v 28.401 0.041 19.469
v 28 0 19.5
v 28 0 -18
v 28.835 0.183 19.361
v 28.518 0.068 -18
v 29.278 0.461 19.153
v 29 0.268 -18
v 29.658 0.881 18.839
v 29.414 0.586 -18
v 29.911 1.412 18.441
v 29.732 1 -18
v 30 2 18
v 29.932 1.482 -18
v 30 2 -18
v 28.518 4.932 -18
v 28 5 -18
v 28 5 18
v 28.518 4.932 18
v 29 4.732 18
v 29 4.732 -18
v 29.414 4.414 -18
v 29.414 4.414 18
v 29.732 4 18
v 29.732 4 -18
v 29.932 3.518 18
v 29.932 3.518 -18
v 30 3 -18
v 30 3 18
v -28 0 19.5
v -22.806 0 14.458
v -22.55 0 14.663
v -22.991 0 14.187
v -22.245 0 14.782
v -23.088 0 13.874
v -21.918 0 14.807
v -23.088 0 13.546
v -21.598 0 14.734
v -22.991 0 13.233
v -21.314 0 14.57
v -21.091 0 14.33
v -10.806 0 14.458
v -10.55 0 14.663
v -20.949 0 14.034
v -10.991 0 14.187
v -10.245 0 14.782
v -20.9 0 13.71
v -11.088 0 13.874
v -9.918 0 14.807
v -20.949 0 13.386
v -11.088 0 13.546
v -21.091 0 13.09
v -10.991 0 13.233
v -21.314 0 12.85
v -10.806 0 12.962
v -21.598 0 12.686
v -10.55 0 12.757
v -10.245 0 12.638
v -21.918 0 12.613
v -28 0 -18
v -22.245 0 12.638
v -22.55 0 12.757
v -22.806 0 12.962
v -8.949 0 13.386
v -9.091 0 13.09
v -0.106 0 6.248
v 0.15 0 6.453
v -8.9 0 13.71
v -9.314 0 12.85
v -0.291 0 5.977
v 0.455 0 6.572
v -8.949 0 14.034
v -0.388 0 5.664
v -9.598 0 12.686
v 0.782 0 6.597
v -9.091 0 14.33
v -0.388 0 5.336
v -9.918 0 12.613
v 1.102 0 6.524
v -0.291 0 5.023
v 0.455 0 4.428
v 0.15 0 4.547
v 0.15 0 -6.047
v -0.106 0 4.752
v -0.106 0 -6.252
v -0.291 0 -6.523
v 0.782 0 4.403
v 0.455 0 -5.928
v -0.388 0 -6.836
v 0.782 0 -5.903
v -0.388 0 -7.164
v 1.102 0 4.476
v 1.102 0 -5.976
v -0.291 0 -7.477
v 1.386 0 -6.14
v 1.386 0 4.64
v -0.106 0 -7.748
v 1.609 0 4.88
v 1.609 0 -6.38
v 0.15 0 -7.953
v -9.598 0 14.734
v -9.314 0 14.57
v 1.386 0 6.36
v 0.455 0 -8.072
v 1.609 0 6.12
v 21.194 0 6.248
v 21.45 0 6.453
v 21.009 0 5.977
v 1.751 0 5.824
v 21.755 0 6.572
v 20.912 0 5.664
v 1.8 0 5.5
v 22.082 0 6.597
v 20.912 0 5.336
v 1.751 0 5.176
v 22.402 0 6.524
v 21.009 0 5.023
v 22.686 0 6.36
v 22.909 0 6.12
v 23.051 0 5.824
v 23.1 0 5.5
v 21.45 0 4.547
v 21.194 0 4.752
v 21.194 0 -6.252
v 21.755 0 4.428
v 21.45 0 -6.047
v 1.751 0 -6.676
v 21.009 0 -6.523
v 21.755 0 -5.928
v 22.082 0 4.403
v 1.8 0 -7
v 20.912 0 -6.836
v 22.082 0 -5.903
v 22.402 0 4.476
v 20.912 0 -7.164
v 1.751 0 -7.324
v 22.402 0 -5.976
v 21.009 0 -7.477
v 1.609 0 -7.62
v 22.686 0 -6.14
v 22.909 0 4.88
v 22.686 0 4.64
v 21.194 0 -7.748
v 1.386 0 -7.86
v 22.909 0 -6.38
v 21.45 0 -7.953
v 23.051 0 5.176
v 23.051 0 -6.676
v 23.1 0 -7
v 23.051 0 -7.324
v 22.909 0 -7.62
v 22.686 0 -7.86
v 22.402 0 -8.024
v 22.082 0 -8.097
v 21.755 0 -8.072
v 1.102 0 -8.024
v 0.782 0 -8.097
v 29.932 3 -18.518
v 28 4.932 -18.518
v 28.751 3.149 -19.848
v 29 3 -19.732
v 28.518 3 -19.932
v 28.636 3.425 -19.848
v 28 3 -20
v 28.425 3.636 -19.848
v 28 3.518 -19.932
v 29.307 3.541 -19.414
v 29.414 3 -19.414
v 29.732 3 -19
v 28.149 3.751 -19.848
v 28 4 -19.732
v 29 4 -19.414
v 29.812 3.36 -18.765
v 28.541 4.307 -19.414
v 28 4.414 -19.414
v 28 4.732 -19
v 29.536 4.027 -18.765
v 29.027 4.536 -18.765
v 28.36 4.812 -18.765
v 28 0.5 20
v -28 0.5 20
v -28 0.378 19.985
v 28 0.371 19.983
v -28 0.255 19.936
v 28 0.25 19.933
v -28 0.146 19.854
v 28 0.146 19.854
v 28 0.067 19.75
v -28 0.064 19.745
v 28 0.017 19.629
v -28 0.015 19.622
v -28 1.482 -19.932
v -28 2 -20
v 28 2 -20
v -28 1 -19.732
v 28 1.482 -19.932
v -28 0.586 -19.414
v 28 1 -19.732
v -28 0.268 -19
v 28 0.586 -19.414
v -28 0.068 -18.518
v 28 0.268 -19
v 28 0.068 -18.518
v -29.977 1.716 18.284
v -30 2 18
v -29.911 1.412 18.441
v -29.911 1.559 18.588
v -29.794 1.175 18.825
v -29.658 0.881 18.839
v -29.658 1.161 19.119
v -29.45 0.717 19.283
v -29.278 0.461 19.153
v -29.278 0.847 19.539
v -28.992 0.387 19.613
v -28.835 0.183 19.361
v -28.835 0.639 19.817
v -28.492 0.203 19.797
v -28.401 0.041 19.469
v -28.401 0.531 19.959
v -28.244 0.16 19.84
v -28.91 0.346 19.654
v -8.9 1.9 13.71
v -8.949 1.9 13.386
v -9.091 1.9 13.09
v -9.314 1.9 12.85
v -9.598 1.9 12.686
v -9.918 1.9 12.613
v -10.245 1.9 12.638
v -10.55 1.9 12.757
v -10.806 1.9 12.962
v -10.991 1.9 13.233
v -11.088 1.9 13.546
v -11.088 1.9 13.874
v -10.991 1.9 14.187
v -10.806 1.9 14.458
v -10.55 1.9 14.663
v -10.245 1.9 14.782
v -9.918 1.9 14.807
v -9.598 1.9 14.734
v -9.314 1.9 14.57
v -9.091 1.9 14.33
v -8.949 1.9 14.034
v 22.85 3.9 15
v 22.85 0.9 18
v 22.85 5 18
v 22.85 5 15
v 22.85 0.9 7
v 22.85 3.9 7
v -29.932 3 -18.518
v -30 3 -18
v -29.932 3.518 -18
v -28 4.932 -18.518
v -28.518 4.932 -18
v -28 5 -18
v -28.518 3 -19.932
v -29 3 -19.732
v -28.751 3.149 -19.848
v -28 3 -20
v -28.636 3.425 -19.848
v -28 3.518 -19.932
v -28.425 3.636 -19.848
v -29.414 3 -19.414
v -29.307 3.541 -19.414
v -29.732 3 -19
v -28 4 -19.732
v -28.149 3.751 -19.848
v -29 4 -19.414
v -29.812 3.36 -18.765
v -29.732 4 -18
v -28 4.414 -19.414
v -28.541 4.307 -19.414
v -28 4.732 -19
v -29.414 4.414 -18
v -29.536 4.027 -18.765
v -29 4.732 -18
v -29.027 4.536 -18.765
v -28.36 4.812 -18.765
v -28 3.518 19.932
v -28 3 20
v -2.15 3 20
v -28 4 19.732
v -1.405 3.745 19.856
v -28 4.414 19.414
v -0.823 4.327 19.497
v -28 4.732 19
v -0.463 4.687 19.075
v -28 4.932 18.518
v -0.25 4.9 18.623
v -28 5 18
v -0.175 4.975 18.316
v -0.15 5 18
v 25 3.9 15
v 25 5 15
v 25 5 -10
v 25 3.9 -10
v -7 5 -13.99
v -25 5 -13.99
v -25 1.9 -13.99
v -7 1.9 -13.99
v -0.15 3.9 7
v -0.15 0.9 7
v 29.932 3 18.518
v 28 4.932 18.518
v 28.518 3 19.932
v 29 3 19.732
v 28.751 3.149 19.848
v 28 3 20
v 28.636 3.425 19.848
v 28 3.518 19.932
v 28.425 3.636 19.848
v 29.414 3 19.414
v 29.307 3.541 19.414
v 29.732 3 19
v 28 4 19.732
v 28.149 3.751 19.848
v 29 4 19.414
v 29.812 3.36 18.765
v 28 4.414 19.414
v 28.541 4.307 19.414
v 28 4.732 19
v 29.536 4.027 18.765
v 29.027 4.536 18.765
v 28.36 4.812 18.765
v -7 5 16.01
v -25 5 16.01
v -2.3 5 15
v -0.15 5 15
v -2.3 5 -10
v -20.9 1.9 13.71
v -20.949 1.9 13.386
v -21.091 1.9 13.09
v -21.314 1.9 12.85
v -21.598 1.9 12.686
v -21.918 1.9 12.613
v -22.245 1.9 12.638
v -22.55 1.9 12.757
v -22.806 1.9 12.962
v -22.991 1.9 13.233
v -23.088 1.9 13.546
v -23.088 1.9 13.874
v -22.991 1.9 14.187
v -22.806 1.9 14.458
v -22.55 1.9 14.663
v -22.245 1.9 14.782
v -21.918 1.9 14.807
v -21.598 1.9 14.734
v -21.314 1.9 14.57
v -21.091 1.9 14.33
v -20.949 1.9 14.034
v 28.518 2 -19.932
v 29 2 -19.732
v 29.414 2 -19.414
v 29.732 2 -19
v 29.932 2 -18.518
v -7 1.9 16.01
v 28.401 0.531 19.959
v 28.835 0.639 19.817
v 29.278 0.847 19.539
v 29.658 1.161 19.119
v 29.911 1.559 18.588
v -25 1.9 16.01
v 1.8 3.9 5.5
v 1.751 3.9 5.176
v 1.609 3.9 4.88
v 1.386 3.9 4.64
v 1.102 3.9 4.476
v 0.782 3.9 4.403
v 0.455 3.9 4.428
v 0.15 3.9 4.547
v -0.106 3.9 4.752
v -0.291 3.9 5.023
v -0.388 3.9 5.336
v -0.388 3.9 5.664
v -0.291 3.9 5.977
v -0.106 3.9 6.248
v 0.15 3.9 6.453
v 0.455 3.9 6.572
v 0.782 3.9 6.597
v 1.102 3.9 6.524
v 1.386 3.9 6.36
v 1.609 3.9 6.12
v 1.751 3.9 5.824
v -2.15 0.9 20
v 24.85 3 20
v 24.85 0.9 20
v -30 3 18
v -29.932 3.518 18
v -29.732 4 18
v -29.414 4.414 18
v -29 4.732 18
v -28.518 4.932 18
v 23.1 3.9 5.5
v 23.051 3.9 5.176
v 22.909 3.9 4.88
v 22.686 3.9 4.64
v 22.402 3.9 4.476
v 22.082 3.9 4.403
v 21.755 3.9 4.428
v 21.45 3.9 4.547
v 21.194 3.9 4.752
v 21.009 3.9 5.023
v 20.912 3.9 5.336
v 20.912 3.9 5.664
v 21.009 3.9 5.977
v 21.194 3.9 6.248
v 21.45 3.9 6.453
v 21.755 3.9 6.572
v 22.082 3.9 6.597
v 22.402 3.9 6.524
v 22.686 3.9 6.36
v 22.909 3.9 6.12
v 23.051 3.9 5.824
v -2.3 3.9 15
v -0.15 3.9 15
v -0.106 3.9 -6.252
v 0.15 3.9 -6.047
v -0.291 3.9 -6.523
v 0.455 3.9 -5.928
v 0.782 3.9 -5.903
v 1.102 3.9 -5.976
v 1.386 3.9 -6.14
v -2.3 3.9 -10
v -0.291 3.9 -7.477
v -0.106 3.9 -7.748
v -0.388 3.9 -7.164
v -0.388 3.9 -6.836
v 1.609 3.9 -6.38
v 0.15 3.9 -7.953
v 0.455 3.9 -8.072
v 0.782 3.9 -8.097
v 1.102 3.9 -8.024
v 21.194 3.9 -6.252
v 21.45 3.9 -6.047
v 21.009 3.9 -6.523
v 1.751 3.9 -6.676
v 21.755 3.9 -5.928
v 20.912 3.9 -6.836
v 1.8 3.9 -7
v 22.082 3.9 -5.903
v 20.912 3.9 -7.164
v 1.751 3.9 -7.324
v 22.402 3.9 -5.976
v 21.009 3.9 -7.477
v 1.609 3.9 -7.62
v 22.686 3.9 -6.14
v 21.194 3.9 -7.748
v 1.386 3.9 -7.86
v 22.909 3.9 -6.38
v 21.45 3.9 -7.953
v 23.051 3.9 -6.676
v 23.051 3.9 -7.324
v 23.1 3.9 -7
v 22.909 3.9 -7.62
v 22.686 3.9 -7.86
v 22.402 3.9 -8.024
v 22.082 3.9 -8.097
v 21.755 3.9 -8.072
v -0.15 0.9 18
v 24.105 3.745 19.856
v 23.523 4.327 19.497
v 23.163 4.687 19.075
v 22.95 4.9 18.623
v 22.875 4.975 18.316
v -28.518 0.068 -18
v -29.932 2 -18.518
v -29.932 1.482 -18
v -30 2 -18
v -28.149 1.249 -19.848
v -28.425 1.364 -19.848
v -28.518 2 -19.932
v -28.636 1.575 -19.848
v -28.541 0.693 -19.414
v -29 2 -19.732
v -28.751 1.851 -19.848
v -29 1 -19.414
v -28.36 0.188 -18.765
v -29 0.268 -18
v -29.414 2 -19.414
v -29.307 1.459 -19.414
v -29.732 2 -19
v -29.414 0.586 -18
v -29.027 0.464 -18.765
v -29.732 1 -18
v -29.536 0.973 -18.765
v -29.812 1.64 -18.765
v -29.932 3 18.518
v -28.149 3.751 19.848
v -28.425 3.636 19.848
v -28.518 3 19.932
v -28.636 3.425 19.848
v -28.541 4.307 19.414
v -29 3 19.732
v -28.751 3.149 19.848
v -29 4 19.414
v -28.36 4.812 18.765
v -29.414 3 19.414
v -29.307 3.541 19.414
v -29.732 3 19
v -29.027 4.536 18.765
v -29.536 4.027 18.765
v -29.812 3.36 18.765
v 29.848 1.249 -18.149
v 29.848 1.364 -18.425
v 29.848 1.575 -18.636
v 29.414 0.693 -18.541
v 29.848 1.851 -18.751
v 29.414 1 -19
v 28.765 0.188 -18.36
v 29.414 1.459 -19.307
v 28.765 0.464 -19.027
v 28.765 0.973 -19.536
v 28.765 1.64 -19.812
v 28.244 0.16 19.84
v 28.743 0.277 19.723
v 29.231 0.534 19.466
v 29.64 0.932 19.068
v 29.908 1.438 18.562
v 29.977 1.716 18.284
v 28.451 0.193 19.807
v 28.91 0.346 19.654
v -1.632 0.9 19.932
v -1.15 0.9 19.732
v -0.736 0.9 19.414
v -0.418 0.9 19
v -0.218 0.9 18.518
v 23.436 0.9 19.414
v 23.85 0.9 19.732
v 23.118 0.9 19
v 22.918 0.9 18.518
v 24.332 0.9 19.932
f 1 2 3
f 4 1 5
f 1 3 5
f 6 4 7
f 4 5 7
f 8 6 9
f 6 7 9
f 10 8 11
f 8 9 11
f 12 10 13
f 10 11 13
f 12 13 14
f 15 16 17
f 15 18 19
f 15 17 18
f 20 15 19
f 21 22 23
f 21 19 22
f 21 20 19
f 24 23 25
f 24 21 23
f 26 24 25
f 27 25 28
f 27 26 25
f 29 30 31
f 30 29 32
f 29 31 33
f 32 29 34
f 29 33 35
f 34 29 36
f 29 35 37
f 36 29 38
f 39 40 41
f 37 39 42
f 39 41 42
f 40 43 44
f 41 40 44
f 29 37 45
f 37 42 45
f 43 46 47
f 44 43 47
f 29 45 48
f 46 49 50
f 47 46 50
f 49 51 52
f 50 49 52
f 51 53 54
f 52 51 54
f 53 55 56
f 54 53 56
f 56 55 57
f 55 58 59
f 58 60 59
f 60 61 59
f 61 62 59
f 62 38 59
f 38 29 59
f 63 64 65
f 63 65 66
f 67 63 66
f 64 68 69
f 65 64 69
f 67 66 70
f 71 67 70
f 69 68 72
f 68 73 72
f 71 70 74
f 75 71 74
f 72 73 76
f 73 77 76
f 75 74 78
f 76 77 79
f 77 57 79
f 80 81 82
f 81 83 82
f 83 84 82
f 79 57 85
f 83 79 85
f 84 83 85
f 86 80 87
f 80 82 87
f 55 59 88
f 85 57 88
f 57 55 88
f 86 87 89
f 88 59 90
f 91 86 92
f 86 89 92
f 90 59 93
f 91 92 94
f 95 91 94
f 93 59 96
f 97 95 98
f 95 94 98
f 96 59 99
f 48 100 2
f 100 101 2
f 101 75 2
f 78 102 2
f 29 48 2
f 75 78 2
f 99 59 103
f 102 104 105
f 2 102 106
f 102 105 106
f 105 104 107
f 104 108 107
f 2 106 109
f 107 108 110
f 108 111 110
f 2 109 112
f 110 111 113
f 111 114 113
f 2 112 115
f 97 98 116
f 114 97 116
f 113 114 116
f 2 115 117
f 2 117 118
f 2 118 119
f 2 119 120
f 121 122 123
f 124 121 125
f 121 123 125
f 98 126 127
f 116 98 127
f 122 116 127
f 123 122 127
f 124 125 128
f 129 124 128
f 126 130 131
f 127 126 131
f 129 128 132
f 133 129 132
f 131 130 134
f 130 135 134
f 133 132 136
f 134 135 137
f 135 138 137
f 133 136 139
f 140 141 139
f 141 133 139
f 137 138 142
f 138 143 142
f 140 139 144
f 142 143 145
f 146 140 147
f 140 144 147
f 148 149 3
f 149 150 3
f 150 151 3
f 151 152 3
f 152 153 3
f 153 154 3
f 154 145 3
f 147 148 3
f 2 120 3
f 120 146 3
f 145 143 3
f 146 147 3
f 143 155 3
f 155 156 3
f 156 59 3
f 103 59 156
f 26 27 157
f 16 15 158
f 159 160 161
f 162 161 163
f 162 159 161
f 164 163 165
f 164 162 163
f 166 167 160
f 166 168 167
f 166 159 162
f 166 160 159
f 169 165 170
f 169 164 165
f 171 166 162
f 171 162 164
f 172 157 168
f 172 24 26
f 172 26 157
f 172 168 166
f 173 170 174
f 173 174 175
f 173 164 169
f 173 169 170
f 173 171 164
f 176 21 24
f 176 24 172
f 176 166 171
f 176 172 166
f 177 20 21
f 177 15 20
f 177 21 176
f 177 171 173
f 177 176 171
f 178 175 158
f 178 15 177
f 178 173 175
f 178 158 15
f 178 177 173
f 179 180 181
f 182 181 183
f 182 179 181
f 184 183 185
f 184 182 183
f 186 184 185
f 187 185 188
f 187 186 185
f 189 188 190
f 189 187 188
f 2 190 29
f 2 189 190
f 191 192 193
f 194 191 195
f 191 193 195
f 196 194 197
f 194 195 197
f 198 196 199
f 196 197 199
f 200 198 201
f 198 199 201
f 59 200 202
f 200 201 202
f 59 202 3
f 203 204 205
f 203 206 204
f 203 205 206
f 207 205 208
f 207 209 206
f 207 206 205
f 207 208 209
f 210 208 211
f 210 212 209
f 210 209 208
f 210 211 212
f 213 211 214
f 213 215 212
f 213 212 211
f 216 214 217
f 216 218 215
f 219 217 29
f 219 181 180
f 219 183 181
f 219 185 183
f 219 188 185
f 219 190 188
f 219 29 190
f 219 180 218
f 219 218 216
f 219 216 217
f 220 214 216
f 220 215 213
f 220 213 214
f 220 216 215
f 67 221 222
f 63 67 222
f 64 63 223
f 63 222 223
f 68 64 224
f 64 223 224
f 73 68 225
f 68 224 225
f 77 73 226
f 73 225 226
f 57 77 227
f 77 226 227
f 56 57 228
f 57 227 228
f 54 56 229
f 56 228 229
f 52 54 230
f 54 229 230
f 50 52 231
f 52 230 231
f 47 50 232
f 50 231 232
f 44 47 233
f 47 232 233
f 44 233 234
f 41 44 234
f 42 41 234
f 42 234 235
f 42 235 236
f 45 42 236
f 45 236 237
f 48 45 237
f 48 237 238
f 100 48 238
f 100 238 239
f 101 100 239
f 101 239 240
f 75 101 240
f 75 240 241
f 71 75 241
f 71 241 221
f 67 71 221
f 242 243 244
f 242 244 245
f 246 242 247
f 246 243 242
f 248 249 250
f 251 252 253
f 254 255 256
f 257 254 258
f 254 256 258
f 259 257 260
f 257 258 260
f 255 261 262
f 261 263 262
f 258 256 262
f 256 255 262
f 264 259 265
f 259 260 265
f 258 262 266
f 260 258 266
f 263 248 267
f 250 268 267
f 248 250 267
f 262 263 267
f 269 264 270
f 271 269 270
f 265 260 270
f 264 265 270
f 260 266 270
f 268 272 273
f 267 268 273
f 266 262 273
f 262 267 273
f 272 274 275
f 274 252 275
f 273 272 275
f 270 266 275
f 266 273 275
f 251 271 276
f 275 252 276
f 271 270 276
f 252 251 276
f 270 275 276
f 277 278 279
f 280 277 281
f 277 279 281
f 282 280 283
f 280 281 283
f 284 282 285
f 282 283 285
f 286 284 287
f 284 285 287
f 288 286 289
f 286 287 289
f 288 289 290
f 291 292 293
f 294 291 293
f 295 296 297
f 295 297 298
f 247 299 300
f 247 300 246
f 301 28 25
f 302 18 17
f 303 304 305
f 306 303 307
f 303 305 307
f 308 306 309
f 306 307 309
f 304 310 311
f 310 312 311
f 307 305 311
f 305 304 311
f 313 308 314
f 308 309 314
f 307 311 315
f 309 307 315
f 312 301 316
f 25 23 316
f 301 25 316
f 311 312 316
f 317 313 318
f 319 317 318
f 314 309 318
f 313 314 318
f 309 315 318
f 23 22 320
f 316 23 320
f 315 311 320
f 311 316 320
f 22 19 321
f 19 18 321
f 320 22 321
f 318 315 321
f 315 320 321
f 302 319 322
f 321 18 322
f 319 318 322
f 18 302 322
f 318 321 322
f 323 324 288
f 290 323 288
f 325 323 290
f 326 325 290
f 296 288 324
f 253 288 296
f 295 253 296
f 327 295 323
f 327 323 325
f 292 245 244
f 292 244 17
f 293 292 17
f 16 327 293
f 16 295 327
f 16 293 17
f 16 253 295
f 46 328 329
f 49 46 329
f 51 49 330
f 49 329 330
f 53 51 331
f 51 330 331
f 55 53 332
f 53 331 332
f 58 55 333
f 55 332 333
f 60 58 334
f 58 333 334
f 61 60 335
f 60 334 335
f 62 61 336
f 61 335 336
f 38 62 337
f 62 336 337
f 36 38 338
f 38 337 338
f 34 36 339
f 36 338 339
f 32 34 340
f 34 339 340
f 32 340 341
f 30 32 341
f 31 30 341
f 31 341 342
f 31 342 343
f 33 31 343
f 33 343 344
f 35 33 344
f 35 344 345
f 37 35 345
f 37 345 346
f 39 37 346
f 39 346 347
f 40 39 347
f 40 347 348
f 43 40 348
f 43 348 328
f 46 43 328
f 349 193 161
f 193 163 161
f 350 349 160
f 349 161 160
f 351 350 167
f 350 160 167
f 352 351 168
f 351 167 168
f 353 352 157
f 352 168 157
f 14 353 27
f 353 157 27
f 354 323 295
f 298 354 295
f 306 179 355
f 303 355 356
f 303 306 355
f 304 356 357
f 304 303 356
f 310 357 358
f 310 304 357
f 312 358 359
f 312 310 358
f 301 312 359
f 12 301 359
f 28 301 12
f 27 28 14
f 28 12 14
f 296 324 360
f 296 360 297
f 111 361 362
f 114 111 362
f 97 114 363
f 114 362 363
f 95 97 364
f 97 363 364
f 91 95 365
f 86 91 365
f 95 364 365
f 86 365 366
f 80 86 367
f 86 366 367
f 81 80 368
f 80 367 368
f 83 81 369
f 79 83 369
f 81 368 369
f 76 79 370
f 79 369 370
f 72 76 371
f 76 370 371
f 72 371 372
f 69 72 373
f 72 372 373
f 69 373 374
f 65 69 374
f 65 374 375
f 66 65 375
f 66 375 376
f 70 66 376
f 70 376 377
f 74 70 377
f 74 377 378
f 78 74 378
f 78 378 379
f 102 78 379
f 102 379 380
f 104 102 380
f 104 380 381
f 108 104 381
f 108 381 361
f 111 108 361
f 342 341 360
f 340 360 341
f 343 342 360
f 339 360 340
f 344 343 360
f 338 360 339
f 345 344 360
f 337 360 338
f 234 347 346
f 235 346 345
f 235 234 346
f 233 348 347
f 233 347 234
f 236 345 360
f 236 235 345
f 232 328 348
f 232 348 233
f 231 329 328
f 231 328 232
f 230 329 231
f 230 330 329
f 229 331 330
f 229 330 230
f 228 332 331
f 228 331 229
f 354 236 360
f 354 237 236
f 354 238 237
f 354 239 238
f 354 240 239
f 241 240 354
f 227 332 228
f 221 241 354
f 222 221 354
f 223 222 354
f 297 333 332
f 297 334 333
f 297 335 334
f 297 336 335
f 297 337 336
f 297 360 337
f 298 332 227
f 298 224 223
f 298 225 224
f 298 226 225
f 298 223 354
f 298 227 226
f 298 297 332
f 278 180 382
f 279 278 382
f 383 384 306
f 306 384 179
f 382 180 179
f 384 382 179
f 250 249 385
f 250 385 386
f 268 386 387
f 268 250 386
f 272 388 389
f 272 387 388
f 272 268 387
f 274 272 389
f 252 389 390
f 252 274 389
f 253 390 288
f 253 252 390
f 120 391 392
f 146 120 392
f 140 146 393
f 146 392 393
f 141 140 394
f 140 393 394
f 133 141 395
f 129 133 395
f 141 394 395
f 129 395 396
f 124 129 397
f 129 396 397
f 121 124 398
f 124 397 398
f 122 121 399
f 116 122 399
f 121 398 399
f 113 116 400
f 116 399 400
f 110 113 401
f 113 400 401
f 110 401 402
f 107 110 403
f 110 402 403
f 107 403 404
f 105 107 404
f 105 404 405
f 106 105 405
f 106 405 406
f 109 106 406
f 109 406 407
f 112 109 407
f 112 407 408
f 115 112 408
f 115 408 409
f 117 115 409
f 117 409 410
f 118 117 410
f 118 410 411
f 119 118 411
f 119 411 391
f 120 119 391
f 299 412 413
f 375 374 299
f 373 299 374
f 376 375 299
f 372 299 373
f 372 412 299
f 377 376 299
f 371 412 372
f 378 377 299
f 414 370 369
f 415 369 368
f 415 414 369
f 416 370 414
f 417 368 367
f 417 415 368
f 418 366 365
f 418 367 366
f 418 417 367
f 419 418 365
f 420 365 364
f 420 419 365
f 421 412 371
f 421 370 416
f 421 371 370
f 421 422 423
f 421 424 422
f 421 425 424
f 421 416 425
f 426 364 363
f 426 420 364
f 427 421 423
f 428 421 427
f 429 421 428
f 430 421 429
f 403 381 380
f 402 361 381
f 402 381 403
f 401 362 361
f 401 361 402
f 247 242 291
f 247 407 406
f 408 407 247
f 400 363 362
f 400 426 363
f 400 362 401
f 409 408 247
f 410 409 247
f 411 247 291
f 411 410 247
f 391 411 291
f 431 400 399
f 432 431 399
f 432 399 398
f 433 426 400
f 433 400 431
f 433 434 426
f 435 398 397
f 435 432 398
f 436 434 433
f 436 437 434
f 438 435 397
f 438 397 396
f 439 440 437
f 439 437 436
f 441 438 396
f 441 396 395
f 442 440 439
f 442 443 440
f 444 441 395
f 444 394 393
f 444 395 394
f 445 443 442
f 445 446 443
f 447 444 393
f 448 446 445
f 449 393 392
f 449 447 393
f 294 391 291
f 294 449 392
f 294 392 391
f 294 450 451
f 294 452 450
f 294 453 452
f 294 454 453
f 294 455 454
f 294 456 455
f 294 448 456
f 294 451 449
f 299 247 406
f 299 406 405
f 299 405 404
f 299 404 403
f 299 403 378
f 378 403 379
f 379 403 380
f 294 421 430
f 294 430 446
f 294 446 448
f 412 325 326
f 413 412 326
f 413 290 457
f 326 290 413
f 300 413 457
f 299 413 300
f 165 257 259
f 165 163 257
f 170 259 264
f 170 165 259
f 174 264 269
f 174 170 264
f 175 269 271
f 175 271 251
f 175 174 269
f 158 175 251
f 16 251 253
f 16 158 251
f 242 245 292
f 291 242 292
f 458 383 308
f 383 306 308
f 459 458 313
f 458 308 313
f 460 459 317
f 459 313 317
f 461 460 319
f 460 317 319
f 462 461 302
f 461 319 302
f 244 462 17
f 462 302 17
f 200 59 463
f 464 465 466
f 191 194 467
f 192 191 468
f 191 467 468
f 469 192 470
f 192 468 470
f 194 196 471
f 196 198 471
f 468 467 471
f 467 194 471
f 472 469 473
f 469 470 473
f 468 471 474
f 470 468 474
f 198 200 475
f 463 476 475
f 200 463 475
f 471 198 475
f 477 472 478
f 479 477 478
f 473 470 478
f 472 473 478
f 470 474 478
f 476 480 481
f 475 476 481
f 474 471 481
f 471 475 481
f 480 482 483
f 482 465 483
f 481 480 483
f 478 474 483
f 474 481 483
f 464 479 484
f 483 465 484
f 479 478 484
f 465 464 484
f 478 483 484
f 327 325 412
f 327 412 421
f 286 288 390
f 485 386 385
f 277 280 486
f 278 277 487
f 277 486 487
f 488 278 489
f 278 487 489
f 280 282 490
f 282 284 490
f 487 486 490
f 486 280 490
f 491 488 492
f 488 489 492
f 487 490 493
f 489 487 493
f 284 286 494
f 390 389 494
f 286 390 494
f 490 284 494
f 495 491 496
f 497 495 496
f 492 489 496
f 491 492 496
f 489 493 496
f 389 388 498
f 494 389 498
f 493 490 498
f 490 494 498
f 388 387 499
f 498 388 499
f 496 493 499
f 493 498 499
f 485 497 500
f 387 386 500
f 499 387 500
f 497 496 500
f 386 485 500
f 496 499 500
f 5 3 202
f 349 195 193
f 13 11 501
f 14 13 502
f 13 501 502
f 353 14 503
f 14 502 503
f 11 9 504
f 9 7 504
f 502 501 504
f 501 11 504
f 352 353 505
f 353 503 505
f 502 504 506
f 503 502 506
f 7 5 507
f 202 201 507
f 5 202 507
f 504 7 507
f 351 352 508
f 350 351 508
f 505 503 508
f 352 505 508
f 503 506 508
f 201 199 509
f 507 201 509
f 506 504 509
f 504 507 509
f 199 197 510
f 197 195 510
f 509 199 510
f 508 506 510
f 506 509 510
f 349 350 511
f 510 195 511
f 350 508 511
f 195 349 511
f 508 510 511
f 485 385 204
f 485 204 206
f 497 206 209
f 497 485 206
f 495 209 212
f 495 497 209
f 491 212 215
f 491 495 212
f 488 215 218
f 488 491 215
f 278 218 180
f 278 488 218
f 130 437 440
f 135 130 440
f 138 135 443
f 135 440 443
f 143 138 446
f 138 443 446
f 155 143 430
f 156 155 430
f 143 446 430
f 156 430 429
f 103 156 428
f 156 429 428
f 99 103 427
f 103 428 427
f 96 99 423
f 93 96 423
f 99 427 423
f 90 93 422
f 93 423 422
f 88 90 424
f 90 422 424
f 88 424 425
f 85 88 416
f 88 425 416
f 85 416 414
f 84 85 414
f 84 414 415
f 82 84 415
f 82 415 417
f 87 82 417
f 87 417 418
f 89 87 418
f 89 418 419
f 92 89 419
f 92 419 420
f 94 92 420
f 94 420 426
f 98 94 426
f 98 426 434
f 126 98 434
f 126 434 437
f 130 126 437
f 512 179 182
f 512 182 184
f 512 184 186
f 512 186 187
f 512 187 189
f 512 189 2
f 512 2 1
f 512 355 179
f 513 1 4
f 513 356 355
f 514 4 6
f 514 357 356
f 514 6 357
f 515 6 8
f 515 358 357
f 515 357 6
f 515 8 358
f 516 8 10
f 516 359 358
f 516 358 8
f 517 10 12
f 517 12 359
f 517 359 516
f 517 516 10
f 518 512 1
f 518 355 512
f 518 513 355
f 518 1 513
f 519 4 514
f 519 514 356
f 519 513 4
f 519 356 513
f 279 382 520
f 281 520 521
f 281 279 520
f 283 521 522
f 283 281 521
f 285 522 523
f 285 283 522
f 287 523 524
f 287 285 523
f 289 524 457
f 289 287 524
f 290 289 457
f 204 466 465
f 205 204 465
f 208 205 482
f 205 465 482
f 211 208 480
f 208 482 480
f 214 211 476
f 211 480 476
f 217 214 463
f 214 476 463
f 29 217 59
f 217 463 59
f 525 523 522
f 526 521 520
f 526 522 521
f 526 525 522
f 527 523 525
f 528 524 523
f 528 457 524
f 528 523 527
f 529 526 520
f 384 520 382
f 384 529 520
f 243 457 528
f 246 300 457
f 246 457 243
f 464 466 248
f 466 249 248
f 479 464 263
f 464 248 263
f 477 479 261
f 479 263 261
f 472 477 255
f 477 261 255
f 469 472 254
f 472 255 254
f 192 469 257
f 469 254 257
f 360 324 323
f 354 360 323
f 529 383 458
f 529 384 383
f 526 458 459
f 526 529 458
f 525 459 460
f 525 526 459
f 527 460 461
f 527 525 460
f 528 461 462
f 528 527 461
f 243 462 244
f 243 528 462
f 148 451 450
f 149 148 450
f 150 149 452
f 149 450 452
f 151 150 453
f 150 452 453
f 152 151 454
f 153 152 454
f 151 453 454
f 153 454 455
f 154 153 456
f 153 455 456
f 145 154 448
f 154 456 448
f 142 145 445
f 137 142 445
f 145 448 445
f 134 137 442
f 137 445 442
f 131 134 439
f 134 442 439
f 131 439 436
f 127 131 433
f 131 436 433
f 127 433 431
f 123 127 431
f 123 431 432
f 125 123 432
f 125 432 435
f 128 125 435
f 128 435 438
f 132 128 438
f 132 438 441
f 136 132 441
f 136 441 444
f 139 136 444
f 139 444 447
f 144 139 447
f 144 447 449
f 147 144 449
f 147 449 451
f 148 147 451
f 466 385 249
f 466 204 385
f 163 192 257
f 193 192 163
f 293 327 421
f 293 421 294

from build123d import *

# Parameters (mm, degrees)
SKETCH1_W               = 60
SKETCH1_H               = 40
BOSS_EXTRUDE1_DEPTH     = 5
SKETCH2_W               = 18
SKETCH2_H               = 30
SKETCH2_R               = 1.1
SKETCH2_W_2             = 27.3
SKETCH2_H_2             = 25
CUT_EXTRUDE1_DEPTH      = 1.1
SKETCH3_W               = 18
SKETCH3_H               = 30
SKETCH3_R               = 1.1
CUT_EXTRUDE2_DEPTH      = 2
SKETCH4_W               = 23
SKETCH4_H               = 13
CUT_EXTRUDE3_DEPTH      = 4
CUT_EXTRUDE3_DEPTH_BACK = 3
SKETCH5_R               = 1.1
CUT_EXTRUDE4_DEPTH      = 6
FILLET1_R               = 2
FILLET2_R               = 0.5


with BuildPart() as part:
    # Sketch1 → Boss-Extrude1 (new body)
    with BuildSketch(Plane(origin=(0, 0, 0), x_dir=(1, 0, 0), z_dir=(0, 1, 0))):
        Rectangle(SKETCH1_W, SKETCH1_H)
    extrude(amount=BOSS_EXTRUDE1_DEPTH)

    # Sketch2 → Cut-Extrude1 (cut)
    with BuildSketch(Plane(origin=(0, 5, 0), x_dir=(1, 0, 0), z_dir=(0, 1, 0))):
        with Locations((-16, -1.01)):
            Rectangle(SKETCH2_W, SKETCH2_H)
        with Locations((-22, -13.71)):
            Circle(SKETCH2_R, mode=Mode.SUBTRACT)
        with Locations((-10, -13.71)):
            Circle(SKETCH2_R, mode=Mode.SUBTRACT)
        with Locations((11.35, -2.5)):
            Rectangle(SKETCH2_W_2, SKETCH2_H_2)
        with Locations((0.7, 7)):
            Circle(SKETCH2_R, mode=Mode.SUBTRACT)
        with Locations((0.7, -5.5)):
            Circle(SKETCH2_R, mode=Mode.SUBTRACT)
        with Locations((22, -5.5)):
            Circle(SKETCH2_R, mode=Mode.SUBTRACT)
        with Locations((22, 7)):
            Circle(SKETCH2_R, mode=Mode.SUBTRACT)
    extrude(amount=-CUT_EXTRUDE1_DEPTH, mode=Mode.SUBTRACT)

    # Sketch3 → Cut-Extrude2 (cut)
    with BuildSketch(Plane(origin=(0, 3.9, 0), x_dir=(1, 0, 0), z_dir=(0, 1, 0))):
        with Locations((-16, -1.01)):
            Rectangle(SKETCH3_W, SKETCH3_H)
        with Locations((-10, -13.71)):
            Circle(SKETCH3_R, mode=Mode.SUBTRACT)
        with Locations((-22, -13.71)):
            Circle(SKETCH3_R, mode=Mode.SUBTRACT)
    extrude(amount=-CUT_EXTRUDE2_DEPTH, mode=Mode.SUBTRACT)

    # Sketch4 → Cut-Extrude3 (cut, two sides)
    with BuildSketch(Plane(origin=(0, 3.9, 0), x_dir=(1, 0, 0), z_dir=(0, 1, 0))) as cut_extrude3_sk:
        with Locations((11.35, -13.5)):
            Rectangle(SKETCH4_W, SKETCH4_H)
    extrude(amount=CUT_EXTRUDE3_DEPTH, mode=Mode.SUBTRACT)
    extrude(cut_extrude3_sk.sketch, amount=-CUT_EXTRUDE3_DEPTH_BACK, mode=Mode.SUBTRACT)

    # Sketch5 → Cut-Extrude4 (cut, through all)
    with BuildSketch(Plane(origin=(0, 5, 0), x_dir=(1, 0, 0), z_dir=(0, 1, 0))):
        with Locations((22, 7)):
            Circle(SKETCH5_R)
        with Locations((22, -5.5)):
            Circle(SKETCH5_R)
        with Locations((0.7, -5.5)):
            Circle(SKETCH5_R)
        with Locations((0.7, 7)):
            Circle(SKETCH5_R)
        with Locations((-10, -13.71)):
            Circle(SKETCH5_R)
        with Locations((-22, -13.71)):
            Circle(SKETCH5_R)
    extrude(amount=-CUT_EXTRUDE4_DEPTH, mode=Mode.SUBTRACT)

    # Fillet1
    fillet1_edges = [part.edges().sort_by_distance(p)[0] for p in [
        (-30, 5, 0),
        (-15.075, 5, 20),
        (30, 5, 0),
        (-30, 0, 0),
        (0, 0, -20),
        (30, 0, 0),
        (30, 2.5, 20),
        (-30, 2.5, 20),
        (-30, 2.5, -20),
        (30, 2.5, -20),
        (26.425, 5, 20),
        (-0.15, 2.95, 20),
        (22.85, 2.95, 20),
        (0, 5, -20),
    ]]
    fillet(fillet1_edges, radius=FILLET1_R)

    # Fillet2
    fillet2_edges = [part.edges().sort_by_distance(p)[0] for p in [
        (0, 0, 20),
        (29.526592034, 0.707902185, 19.292097815),
        (-29.526592034, 0.707902185, 19.292097815),
    ]]
    fillet(fillet2_edges, radius=FILLET2_R)


solid = part.part
